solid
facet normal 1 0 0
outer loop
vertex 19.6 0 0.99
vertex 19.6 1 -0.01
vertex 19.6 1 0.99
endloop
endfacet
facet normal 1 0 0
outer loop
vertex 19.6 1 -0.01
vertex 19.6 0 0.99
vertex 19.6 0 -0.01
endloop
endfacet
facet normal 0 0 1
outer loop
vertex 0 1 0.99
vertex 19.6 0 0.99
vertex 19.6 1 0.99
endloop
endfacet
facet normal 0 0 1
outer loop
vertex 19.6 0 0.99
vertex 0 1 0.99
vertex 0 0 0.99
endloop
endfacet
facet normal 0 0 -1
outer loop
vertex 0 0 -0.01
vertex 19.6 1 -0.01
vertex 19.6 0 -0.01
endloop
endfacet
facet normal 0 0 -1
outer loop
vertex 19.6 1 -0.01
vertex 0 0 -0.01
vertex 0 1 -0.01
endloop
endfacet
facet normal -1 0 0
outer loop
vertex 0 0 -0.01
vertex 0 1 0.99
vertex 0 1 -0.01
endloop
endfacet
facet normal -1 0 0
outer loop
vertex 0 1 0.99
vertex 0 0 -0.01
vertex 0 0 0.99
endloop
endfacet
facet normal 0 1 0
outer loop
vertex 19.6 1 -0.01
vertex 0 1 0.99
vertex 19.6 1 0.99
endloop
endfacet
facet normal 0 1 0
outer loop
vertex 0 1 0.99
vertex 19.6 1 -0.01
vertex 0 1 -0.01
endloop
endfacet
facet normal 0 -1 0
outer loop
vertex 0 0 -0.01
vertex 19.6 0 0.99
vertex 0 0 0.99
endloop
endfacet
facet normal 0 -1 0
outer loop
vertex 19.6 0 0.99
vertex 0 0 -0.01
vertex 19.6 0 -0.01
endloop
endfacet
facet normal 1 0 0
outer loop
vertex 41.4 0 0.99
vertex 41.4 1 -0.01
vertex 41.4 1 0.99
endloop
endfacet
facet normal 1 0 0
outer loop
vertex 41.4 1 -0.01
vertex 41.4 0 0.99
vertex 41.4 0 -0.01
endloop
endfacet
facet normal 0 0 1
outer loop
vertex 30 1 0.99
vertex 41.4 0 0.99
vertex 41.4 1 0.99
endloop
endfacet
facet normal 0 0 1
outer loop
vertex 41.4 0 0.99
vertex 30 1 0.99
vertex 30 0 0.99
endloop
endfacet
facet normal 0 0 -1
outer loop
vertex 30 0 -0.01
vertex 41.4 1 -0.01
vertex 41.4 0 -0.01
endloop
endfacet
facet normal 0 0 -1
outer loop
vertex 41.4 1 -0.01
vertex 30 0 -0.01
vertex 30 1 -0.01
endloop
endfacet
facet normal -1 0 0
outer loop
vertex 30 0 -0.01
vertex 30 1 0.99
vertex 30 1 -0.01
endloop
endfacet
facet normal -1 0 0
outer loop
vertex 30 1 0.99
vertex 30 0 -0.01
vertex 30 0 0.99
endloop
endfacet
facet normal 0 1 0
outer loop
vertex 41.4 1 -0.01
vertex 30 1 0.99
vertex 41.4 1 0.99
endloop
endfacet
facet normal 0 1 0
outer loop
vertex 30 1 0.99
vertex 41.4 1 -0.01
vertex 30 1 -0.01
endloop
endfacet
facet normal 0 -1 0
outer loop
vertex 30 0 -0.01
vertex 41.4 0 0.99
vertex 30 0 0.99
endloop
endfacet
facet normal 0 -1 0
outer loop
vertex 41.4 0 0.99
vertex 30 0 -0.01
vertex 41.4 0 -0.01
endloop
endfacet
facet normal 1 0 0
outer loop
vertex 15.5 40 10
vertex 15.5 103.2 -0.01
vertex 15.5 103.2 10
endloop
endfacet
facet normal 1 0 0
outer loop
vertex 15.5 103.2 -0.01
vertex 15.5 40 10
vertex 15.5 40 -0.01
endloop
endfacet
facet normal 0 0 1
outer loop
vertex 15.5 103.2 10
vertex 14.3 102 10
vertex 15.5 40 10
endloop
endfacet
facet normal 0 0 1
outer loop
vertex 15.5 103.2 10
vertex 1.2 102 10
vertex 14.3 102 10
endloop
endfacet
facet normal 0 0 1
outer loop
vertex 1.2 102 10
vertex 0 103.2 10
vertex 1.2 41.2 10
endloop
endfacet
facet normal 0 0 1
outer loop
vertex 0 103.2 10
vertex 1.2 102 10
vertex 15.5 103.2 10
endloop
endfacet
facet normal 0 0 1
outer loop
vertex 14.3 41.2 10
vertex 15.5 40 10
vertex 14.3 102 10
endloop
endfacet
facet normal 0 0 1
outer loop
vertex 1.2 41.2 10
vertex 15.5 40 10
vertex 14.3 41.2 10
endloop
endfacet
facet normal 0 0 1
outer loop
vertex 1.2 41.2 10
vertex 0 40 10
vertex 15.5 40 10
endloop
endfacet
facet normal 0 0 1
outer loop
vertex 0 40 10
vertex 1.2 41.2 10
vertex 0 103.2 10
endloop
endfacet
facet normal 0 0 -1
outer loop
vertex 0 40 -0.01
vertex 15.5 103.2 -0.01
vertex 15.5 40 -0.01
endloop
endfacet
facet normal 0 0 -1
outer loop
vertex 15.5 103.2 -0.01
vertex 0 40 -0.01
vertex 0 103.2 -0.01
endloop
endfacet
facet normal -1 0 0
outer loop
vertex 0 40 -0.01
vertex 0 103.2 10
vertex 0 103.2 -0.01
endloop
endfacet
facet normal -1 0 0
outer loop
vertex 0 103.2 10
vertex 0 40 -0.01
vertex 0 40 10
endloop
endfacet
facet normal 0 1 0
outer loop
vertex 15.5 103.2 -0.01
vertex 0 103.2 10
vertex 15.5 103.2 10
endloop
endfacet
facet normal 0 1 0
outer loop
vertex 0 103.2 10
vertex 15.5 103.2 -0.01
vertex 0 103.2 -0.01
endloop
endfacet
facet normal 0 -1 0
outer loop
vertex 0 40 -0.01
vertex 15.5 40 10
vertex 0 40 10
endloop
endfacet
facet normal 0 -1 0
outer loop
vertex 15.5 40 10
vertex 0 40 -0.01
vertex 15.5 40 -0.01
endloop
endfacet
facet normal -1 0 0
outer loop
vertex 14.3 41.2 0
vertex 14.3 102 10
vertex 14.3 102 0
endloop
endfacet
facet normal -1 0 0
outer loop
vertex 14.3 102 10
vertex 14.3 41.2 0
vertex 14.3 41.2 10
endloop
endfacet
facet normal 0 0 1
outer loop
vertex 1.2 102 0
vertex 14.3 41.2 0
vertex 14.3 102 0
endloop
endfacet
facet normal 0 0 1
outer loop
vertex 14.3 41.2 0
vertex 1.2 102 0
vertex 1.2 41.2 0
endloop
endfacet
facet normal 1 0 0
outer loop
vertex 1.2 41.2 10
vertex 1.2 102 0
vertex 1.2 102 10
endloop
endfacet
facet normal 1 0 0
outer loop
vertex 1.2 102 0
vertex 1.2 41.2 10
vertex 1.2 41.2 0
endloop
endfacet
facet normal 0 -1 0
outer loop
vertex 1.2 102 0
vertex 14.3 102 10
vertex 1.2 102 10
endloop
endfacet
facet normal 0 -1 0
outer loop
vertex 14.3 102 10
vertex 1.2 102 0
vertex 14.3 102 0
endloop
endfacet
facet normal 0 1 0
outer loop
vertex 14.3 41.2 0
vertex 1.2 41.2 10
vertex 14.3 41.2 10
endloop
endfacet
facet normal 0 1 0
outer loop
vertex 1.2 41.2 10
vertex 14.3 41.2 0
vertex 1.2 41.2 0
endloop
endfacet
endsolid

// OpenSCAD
// file: ../../Base/Boxes.scad
// Fischertechnik Box Foundation
// Pre-designed Boxes

use <Constants.scad>

include <PlacementOptions.scad>

box190Width = 190;
box190Depth = 130;
box130Width = 130;
box130Depth = 95;
boxUsageHeight = 33.9;
boxWallThickness = 2.4;
boxBaseThickness = 1.0;

// getBoxWallThickness()
// Gets the wall thickness of a Fischertechnik Box

function getBoxWallThickness() = boxWallThickness;

// Gets the usable height of a fischertechnik box
function getBoxUsageHeight() = boxUsageHeight;

// Gets the thickness of the Fischertechnik box base.
function getBoxBaseThickness() = boxBaseThickness;

// Gets the usable inner space of a Box 190 as an x/y-list
function getBox190Space() = [
    box190Width - 2*getBoxWallThickness(), 
    box190Depth - 2*getBoxWallThickness() ];

// Imports the Fischertechnik empty box 130x190 mm and places it at position 0,0
// 190x130 are the outer sizes, the inner space is slightly smaller. Use getBox190Space() to get the inner sizes.
// This module needs the STL file "Fischertechnik Box 130x190.stl" in the library path.
// The box is positioned that the usable inner space is at the 0,0,0 position. The

module Box190() {
    translate([-getBoxWallThickness(),-getBoxWallThickness(),-getBoxBaseThickness()])
        import("Fischertechnik Box 130x190.stl", convexity=3);
}

// Gets the usable inner space of a Box 130 as an x/y-list
function getBox130Space() = [
    box130Width - 2*getBoxWallThickness(), 
    box130Depth - 2*getBoxWallThickness() ];

// Imports the Fischertechnik empty box 95x130 mm and places it at position 0,0
// 190x130 are the outer sizes, the inner space is slightly smaller. Use getBox190Space() to get the inner sizes.
// This module needs the STL file "Fischertechnik Box 95x130.stl" in the library path.
// The box is positioned that the usable inner space is at the 0,0,0 position. The

module Box130() {
    translate([-getBoxWallThickness(),-getBoxWallThickness(),-getBoxBaseThickness()])
        import("Fischertechnik Box 95x130.stl", convexity=3);
}

// Creates a web at the specified box walls
// corner 0 = LowerLeft, 1 = UpperLeft, 2 = UpperRight, 3 = LowerRight
// side 0 = LeftOfCorner, 1 = RightOfCorner
// distance = Distance in mm from the corner
// box = inner width and depth of the box (default: Box 190)
// webWidth = length of the web (default is 3 mms)
// webThickness = thickness of the web (default is 1 mm)

module BoxWeb(corner, side, distance, box=getBox190Space(), webWidth=3, webThickness=1.0) {
    sink = getBoxWallThickness()/2;

    width = (corner % 2 == 0) ? 
            (side == LeftOfCorner ? webWidth : webThickness) :
            (side == LeftOfCorner ? webThickness : webWidth);

    depth = (corner % 2 == 0) ? 
            (side == RightOfCorner ? webWidth : webThickness) :
            (side == RightOfCorner ? webThickness : webWidth);
    
    xDiff = corner == LowerLeft ? 
                (side == LeftOfCorner ? -sink : distance) :
            (corner == UpperLeft ?                
                (side == LeftOfCorner ? distance : -sink) :
            (corner == UpperRight ?
                (side == LeftOfCorner ? box.x-webWidth+sink : box.x-distance-webThickness) :
                (side == LeftOfCorner ? box.x-distance-webThickness: box.x-webWidth+sink)));

    yDiff = corner == LowerLeft ? 
                (side == RightOfCorner ? -sink : distance) :
            (corner == UpperLeft ?
                (side == RightOfCorner ? box.y-distance : box.y-webWidth+sink) :
            (corner == UpperRight ?
                (side == RightOfCorner ? box.y-webWidth+sink : box.y-distance) :
                (side == RightOfCorner ? distance : -sink)));
    
    translate([xDiff, yDiff, -getExcess()])
        cube([width, depth, boxUsageHeight + 2*getExcess()]);
}
// file: ../../Base/Rotation.scad
// Fischertechnik Box Foundation
// Geometry Helpers Rotation

include <PlacementOptions.scad>

// getRotatedSpace(space, rotation=NoRotation)
// Rotates the space dependent on the specified rotation

function getRotatedSpace(space, rotation=NoRotation) = [
    (rotation == Rotate90 || rotation == Rotate270) ? space.y : space.x,
    (rotation == Rotate90 || rotation == Rotate270) ? space.x : space.y
];

// Rotates the given space around the fixed left lower corner
// space = the space the children needs as width/depth list [width,depth]
// rotation = 0 Rotate0 degrees, 1 Rotate90 degrees, 2 Rotate180 degrees, 3 Rotate270 degrees (equivalent to -90)

module RotateFix(space, rotation=Rotate0) {
    dy = (rotation == Rotate0 || rotation == Rotate270) ? 0 :
        (rotation == Rotate90) ? space.x :
        space.y;
    dx = (rotation < Rotate180) ? 0 :
        (rotation == Rotate180) ? space.x :
        space.y;
    
    translate([dx, dy, 0])
        rotate([0, 0, rotations[rotation]])
            children();
}
// file: ../../Base/Alignment.scad
// Fischertechnik Box Foundation
// Geometry Helpers Alignment

include <PlacementOptions.scad>

// getAlignedX(elementWidth, spaceWidth, align=AlignRight, offset=0)
// Gets the aligned X offset of an element with the given
// width in the given space.
// elementWidth = The width of the element to positon
// spaceWidth = The space where the element should be aligned
// align = 0 AlignLeft, 1 AlignCenter, 2 AlignRight
// offset = an optional offset from the aligned position. When
// aligned left or centered, then positive values are in X direction.
// When aligned right then positive values are in negative X direction.

function getAlignedX(elementWidth, spaceWidth, align=AlignRight, offset=0) =
    (align == AlignLeft) ?
        offset :
        ((align == AlignCenter) ?
        (spaceWidth - elementWidth)/2 + offset :
        spaceWidth - offset - elementWidth);

// getAlignedY(elementDepth, spaceDepth, align=AlignTop, offset=0)
// Gets the aligned Y offset of an element with the given
// depth in the given space.
// elementDepth = The depth of the element to positon
// spaceDepth = The space where the element should be aligned
// align = 0 AlignBottom, 1 AlignCenter, 2 AlignTop
// offset = an optional offset from the aligned position. When
// aligned bottom or centered, then positive values are in Y direction.
// When aligned top then positive values are in negative Y direction.

function getAlignedY(elementDepth, spaceDepth, align=AlignTop, offset=0) =
    (align == AlignBottom) ?
        offset :
        ((align == AlignCenter) ?
        (spaceDepth - elementDepth)/2 + offset :
        spaceDepth - offset - elementDepth);
// file: ../../Base/PlacementOptions.scad
// Fischertechnik Box Foundation
// Placement Options

// Alignment
NoAlign = 0;
AlignLeft = 1;
AlignBottom = 2;
AlignCenter = 3;
AlignRight = 4;
AlignTop = 5;

// Element rotation degree steps
rotations = [0, -90, -180, -270];

// Rotation
NoRotation = 0;
Rotate0 = 0;
Rotate90 = 1;
Rotate180 = 2;
Rotate270 = 3;

// Docking (seen from above)
NoDock = -1;
DockLeft = 0;
DockTop = 1;
DockRight = 2;
DockCorner = 2;
DockBottom = 3;

// Web corners
LowerLeft = 0;
UpperLeft = 1;
UpperRight = 2;
LowerRight = 3;

// Web position relative to corner
LeftOfCorner = 0;
RightOfCorner = 1;
// file: ../../Base/Placement.scad
// Fischertechnik Box Foundation
// Geometry Helpers Placement

use <Constants.scad>
use <Alignment.scad>
use <Rotation.scad>
use <Boxes.scad>

include <PlacementOptions.scad>

// Place(x=0, y=0, elementSpace=[0,0], alignX=AlignLeft, alignY=AlignBottom, rotation=Rotate0, boxSpace=getBox190Space())
// Places the child at the specified position
// y = Y-Position. This is a relative position when an X aligment is specified.
// x = X-Position. This is a relative position when an Y aligment is specified.
// elementSpace = space of the element to be placed [x,y]
// alignX = -1=NoAlign, 0 AlignLeft, 1 AlignCenter, 3 AlignRight (elementSpace and boxSpace required!)
// alignY = -1=NoAlign, 2 AlignBottom, 1 AlignCenter, 4 AlignTop (elementSpace and boxSpace required!)
// rotation = 0 Rotate0 0 degrees, 1 Rotate90 90 degrees, 
// 2 Rotate180 180 degrees, 3 Rotate270 270 degrees (equivalent to -90)
// boxSpace = Inner space of the box where the placement occurs [x,y] - default is Box 190x130 inner space

module Place(x=0, y=0, elementSpace=[0,0], 
  alignX=AlignLeft, alignY=AlignBottom, 
  rotation=NoRotation, boxSpace=getBox190Space()) {

    module Position(x, y, space, rotation=Rotate0) {
        translate([x, y, 0])
            RotateFix(space, rotation)
                children(0);
    }

    space = getRotatedSpace(elementSpace, rotation);
    alignedX = getAlignedX(space.x, boxSpace.x, alignX, x);
    alignedY = getAlignedY(space.y, boxSpace.y, alignY, y);
    Position(alignedX, alignedY, elementSpace, rotation)
        children(0);
}

// Center(space=getBox130Space(), elementSpace=[0,0])
// space = Space where the children is centered. For cylinder use centered=true and no elementSpace.
// elementSpace = space of the element to be centered [x,y]

module Center(space=getBox190Space(), elementSpace=[0,0]) {
    translate([(space.x - elementSpace.x) / 2, (space.y - elementSpace.y) / 2])
        children(0);
}

// CenterHorizontal(width=0, y=0, offset=0, space=getBox130Space())
// space = Space where the children is centered. For cylinder use centered=true and no elementSpace.
// elementSpace = space of the element to be centered [x,y]

module CenterHorizontal(width=0, y=0, offset=0, space=getBox190Space()) {
    translate([(space.x - width) / 2 + offset, y])
        children(0);
}

// CenterVertical(depth=0, x=0, offset=0, space=getBox130Space())
// space = Space where the children is centered. For cylinder use centered=true and no elementSpace.
// elementSpace = space of the element to be centered [x,y]

module CenterVerticalal(depth=0, x=0, offset=0, space=getBox190Space()) {
    translate([x, (space.y - depth) / 2 + offset])
        children(0);
}
// file: ../../Base/Constants.scad
// Fischertechnik Box Foundation
// Constants

// Constant values necessary for multiple elements

// Base constants
dividerThickness = 1.2;
excess = 0.01;
fragments = 90;
tolerance = 0.8;

// Gets the thickness of a divider 
function getDividerThickness() = dividerThickness;

// Gets the excess that is used to merge walls into each other
function getExcess() = excess;

// Gets amount of fragments of a cylinder
function getFragments() = fragments;

// Gets the inner tolerance of a frame to each side
function getTolerance() = tolerance;


// Fischertechnik specific constants
axisDiameter = 4;
axisBottomDiameter = axisDiameter + 1;
standardEdgeDistance = 2.5;
standardWebDistance = 11.5;
standardCornerLength = 15;
tubeWallFactor = 1.6;

// Gets axis diameter
function getAxisDiameter() = axisDiameter;

// Gets axis bottom diameter for thicker part at the bottom
function getAxisBottomDiameter() = axisBottomDiameter;

// gets the standard distance to the wall of the box for dockable frames with webs
function getStandardEdgeDistance() = standardEdgeDistance;

// gets the standard distance of each web to the corner of the dockable frame
function getStandardWebDistance() = standardWebDistance;

// gets the standard length of the corner walls of a dockable frame
function getStandardCornerLength() = standardCornerLength;

// gets the wall thickness of a tube.
function getTubeWallThickness() = tubeWallFactor * getDividerThickness();
// main file
// Fischertechnik Box Foundation
// ModelBase
// Test FrameFlatPiece

use <../../Base/Constants.scad>
use <../../ModelBase/Complex.scad>

FrameFlatPiece(4);

translate([30, 0, 0])
    FrameFlatPiece(2);

translate([0, 40, 0])
    FrameFlatPiece(3, 60);
